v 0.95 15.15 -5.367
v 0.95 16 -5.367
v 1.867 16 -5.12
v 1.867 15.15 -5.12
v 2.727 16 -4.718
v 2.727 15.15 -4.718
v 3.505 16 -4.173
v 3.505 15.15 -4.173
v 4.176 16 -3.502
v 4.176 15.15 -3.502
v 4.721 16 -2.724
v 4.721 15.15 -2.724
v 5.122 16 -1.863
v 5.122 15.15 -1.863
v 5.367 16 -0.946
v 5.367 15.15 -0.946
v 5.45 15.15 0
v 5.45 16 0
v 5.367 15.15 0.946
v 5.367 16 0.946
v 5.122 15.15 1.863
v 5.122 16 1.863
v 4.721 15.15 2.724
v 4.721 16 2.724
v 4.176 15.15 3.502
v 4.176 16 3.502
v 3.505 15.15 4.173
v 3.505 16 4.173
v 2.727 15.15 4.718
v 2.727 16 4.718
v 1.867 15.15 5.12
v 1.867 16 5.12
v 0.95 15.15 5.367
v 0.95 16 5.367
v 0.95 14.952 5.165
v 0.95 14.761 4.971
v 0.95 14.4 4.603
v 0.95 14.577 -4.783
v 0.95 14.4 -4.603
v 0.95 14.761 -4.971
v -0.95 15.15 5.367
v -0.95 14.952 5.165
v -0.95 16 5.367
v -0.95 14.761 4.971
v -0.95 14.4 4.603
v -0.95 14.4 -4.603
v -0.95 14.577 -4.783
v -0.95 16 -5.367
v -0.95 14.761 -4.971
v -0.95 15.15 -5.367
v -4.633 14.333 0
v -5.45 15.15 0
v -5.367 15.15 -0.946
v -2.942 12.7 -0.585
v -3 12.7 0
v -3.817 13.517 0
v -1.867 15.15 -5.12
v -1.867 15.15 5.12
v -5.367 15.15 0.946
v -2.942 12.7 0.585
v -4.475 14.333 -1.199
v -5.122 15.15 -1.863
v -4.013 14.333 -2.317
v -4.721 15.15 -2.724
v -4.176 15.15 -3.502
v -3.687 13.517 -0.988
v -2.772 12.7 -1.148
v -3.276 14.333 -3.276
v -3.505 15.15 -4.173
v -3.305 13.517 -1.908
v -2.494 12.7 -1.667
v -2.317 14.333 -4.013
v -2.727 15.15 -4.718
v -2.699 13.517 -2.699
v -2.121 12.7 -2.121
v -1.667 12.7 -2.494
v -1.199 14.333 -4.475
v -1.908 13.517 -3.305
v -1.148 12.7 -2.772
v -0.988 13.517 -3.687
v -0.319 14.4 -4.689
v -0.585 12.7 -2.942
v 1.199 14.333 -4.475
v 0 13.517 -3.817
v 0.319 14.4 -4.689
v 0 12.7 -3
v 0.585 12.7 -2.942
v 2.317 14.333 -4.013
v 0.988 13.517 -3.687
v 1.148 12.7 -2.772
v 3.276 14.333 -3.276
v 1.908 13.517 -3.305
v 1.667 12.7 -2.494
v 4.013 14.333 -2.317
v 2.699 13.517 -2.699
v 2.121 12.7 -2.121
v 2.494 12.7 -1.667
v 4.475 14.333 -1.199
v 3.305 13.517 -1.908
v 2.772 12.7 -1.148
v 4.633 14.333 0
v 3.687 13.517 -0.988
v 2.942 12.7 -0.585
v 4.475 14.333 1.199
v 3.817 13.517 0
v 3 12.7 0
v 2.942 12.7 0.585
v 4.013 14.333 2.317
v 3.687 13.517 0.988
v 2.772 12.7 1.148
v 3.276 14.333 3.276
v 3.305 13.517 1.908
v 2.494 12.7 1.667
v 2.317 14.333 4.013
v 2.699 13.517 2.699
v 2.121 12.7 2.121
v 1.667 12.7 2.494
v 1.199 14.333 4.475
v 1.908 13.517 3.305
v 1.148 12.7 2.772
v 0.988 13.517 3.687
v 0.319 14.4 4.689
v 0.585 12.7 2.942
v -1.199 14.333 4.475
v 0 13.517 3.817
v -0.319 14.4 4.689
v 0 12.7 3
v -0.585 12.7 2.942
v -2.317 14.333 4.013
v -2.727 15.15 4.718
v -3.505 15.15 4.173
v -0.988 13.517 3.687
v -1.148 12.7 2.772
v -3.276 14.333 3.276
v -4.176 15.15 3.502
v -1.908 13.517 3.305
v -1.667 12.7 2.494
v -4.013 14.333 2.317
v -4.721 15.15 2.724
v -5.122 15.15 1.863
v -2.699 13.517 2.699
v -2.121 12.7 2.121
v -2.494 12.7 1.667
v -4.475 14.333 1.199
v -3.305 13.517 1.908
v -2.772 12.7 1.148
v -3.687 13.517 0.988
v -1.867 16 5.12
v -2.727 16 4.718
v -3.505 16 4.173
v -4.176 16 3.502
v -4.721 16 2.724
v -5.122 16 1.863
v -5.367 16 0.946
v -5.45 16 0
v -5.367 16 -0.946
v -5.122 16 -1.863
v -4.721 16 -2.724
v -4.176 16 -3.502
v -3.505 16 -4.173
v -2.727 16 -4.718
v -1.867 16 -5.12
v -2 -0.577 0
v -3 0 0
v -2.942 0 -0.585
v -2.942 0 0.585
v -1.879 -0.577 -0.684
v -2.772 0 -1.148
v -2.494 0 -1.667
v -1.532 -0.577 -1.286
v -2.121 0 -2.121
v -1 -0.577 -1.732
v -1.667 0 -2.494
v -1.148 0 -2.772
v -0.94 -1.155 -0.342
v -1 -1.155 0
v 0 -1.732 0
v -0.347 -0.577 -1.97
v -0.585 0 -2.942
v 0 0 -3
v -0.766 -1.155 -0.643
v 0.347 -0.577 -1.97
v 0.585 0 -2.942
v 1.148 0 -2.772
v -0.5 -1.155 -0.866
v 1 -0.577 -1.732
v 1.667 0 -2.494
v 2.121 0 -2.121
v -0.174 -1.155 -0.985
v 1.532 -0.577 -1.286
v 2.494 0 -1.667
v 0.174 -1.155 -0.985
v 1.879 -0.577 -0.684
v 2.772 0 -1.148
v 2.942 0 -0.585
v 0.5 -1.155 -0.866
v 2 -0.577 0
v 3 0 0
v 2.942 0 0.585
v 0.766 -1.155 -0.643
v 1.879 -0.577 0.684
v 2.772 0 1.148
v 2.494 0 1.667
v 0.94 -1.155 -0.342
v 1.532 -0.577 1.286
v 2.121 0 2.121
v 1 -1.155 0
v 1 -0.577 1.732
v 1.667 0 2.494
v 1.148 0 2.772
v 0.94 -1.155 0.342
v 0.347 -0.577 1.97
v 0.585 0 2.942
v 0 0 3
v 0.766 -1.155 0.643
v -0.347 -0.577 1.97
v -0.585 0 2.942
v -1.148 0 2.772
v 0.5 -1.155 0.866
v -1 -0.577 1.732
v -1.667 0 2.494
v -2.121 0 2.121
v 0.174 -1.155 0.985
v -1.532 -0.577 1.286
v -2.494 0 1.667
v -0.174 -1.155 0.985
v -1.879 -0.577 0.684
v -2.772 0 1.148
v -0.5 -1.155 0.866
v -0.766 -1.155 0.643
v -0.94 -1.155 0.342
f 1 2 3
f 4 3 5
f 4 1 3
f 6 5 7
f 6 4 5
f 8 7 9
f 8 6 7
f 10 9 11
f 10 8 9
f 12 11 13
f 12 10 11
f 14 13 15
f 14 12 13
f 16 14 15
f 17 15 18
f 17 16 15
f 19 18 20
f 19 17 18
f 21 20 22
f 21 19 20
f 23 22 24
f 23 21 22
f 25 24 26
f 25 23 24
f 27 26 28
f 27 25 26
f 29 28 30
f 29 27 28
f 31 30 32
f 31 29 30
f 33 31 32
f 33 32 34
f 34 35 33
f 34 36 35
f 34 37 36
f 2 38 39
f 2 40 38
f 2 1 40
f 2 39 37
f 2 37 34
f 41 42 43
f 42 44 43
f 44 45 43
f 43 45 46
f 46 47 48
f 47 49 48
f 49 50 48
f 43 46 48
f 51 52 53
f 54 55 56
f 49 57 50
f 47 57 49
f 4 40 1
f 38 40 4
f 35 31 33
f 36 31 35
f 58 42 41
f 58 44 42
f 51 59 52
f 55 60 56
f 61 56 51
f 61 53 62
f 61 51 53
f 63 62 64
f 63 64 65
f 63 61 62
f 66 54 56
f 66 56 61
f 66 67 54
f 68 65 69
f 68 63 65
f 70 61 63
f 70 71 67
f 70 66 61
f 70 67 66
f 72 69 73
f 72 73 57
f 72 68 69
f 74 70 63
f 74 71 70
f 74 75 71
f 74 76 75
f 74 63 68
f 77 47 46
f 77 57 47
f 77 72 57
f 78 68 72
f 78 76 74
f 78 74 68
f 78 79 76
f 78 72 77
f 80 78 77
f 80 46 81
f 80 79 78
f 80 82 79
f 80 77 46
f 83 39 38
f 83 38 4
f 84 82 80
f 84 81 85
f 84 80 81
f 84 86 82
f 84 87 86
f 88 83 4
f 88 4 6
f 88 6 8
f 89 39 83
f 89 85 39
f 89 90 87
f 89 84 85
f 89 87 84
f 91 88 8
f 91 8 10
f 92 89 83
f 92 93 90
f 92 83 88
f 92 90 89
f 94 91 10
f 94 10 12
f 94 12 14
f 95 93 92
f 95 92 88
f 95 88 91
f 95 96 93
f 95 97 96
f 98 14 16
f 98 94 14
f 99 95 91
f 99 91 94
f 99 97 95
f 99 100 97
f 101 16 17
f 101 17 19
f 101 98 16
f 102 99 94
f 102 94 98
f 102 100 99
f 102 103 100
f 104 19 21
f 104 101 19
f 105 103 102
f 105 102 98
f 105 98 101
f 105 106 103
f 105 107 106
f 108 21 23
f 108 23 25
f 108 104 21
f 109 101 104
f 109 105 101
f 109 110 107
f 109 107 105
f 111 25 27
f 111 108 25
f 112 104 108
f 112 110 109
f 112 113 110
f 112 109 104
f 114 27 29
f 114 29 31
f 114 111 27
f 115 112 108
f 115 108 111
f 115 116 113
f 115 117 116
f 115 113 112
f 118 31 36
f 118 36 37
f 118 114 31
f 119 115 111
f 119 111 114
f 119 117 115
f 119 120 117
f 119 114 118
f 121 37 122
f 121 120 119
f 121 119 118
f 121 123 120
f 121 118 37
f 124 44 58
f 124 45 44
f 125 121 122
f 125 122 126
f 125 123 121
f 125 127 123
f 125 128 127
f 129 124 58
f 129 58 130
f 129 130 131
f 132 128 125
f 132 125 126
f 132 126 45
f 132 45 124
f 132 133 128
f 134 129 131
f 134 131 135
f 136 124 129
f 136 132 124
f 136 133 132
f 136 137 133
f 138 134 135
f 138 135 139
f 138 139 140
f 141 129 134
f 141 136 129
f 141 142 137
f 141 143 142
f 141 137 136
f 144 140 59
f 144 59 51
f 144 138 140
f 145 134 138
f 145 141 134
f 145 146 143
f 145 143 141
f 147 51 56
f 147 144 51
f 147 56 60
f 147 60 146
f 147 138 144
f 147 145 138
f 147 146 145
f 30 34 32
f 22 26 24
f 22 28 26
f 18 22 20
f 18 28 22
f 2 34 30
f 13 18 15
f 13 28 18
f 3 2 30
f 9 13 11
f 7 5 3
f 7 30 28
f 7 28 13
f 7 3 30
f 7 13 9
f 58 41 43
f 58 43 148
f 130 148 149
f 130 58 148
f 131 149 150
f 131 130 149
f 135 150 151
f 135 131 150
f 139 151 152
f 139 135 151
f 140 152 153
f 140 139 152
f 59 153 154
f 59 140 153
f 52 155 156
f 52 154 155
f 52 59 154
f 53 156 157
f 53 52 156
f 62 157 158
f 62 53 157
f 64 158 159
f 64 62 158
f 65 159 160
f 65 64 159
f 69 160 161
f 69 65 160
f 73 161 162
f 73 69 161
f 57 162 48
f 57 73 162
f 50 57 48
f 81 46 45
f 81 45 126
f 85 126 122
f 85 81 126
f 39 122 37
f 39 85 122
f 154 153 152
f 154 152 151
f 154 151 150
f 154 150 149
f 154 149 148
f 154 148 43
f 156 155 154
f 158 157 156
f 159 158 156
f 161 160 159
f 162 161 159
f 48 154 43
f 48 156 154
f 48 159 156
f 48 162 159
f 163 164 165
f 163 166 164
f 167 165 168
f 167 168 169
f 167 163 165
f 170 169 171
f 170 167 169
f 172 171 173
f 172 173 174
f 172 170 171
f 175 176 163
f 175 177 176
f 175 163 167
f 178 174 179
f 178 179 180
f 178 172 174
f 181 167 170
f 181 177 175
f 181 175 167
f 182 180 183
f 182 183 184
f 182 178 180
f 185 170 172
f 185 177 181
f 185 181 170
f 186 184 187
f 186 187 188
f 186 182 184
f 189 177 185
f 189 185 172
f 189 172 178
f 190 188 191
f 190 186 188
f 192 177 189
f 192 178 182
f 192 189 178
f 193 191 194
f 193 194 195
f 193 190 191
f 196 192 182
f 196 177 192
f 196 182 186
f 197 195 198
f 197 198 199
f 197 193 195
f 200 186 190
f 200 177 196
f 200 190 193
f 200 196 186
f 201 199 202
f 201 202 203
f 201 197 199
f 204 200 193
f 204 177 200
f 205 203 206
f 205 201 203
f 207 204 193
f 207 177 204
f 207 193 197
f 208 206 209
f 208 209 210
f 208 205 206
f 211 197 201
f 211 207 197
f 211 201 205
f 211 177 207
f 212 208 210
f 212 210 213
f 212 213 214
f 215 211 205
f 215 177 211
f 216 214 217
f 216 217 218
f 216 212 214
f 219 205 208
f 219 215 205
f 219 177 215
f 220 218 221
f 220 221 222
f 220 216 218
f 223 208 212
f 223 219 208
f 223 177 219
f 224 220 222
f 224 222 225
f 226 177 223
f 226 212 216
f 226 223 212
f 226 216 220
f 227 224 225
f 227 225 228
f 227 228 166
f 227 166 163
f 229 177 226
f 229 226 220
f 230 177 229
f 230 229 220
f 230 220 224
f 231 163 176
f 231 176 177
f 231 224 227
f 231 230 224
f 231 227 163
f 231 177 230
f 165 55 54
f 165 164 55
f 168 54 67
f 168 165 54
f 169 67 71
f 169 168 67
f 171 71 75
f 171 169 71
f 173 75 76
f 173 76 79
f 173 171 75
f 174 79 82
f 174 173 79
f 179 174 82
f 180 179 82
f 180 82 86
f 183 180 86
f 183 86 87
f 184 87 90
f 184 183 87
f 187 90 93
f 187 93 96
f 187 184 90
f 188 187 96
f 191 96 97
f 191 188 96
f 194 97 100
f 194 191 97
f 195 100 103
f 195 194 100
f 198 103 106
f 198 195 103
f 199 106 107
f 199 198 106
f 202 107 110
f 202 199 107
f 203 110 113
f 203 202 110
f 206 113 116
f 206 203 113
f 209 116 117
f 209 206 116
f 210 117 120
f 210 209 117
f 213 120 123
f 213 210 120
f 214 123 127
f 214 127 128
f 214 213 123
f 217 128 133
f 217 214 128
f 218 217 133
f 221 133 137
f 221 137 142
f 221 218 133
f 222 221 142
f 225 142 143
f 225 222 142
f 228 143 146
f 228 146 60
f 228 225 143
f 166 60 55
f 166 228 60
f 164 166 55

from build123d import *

# Parameters (mm, degrees)
CUT_EXTRUDE1_DEPTH      = 18.759645267
CUT_EXTRUDE1_DEPTH_BACK = 18.759645267
SKETCH2_W               = 1.9
SKETCH2_H               = 1.6


with BuildPart() as part:
    # Sketch1 → Revolve1 (revolve)
    with BuildSketch(Plane.XY):
        Polygon((0, 16), (-5.45, 16), (-5.45, 15.15), (-3, 12.7), (-3, 0), (0, -1.732050808), align=None)
    revolve(axis=Axis((0, 16, 0), (0, -1, 0)))

    # Sketch2 → Cut-Extrude1 (cut, two sides: drawn at the far end of the back side and taken through both)
    with BuildSketch(Plane.XY.offset(-CUT_EXTRUDE1_DEPTH_BACK)):
        with Locations((0, 15.2)):
            Rectangle(SKETCH2_W, SKETCH2_H)
    extrude(amount=CUT_EXTRUDE1_DEPTH + CUT_EXTRUDE1_DEPTH_BACK, mode=Mode.SUBTRACT)


solid = part.part
